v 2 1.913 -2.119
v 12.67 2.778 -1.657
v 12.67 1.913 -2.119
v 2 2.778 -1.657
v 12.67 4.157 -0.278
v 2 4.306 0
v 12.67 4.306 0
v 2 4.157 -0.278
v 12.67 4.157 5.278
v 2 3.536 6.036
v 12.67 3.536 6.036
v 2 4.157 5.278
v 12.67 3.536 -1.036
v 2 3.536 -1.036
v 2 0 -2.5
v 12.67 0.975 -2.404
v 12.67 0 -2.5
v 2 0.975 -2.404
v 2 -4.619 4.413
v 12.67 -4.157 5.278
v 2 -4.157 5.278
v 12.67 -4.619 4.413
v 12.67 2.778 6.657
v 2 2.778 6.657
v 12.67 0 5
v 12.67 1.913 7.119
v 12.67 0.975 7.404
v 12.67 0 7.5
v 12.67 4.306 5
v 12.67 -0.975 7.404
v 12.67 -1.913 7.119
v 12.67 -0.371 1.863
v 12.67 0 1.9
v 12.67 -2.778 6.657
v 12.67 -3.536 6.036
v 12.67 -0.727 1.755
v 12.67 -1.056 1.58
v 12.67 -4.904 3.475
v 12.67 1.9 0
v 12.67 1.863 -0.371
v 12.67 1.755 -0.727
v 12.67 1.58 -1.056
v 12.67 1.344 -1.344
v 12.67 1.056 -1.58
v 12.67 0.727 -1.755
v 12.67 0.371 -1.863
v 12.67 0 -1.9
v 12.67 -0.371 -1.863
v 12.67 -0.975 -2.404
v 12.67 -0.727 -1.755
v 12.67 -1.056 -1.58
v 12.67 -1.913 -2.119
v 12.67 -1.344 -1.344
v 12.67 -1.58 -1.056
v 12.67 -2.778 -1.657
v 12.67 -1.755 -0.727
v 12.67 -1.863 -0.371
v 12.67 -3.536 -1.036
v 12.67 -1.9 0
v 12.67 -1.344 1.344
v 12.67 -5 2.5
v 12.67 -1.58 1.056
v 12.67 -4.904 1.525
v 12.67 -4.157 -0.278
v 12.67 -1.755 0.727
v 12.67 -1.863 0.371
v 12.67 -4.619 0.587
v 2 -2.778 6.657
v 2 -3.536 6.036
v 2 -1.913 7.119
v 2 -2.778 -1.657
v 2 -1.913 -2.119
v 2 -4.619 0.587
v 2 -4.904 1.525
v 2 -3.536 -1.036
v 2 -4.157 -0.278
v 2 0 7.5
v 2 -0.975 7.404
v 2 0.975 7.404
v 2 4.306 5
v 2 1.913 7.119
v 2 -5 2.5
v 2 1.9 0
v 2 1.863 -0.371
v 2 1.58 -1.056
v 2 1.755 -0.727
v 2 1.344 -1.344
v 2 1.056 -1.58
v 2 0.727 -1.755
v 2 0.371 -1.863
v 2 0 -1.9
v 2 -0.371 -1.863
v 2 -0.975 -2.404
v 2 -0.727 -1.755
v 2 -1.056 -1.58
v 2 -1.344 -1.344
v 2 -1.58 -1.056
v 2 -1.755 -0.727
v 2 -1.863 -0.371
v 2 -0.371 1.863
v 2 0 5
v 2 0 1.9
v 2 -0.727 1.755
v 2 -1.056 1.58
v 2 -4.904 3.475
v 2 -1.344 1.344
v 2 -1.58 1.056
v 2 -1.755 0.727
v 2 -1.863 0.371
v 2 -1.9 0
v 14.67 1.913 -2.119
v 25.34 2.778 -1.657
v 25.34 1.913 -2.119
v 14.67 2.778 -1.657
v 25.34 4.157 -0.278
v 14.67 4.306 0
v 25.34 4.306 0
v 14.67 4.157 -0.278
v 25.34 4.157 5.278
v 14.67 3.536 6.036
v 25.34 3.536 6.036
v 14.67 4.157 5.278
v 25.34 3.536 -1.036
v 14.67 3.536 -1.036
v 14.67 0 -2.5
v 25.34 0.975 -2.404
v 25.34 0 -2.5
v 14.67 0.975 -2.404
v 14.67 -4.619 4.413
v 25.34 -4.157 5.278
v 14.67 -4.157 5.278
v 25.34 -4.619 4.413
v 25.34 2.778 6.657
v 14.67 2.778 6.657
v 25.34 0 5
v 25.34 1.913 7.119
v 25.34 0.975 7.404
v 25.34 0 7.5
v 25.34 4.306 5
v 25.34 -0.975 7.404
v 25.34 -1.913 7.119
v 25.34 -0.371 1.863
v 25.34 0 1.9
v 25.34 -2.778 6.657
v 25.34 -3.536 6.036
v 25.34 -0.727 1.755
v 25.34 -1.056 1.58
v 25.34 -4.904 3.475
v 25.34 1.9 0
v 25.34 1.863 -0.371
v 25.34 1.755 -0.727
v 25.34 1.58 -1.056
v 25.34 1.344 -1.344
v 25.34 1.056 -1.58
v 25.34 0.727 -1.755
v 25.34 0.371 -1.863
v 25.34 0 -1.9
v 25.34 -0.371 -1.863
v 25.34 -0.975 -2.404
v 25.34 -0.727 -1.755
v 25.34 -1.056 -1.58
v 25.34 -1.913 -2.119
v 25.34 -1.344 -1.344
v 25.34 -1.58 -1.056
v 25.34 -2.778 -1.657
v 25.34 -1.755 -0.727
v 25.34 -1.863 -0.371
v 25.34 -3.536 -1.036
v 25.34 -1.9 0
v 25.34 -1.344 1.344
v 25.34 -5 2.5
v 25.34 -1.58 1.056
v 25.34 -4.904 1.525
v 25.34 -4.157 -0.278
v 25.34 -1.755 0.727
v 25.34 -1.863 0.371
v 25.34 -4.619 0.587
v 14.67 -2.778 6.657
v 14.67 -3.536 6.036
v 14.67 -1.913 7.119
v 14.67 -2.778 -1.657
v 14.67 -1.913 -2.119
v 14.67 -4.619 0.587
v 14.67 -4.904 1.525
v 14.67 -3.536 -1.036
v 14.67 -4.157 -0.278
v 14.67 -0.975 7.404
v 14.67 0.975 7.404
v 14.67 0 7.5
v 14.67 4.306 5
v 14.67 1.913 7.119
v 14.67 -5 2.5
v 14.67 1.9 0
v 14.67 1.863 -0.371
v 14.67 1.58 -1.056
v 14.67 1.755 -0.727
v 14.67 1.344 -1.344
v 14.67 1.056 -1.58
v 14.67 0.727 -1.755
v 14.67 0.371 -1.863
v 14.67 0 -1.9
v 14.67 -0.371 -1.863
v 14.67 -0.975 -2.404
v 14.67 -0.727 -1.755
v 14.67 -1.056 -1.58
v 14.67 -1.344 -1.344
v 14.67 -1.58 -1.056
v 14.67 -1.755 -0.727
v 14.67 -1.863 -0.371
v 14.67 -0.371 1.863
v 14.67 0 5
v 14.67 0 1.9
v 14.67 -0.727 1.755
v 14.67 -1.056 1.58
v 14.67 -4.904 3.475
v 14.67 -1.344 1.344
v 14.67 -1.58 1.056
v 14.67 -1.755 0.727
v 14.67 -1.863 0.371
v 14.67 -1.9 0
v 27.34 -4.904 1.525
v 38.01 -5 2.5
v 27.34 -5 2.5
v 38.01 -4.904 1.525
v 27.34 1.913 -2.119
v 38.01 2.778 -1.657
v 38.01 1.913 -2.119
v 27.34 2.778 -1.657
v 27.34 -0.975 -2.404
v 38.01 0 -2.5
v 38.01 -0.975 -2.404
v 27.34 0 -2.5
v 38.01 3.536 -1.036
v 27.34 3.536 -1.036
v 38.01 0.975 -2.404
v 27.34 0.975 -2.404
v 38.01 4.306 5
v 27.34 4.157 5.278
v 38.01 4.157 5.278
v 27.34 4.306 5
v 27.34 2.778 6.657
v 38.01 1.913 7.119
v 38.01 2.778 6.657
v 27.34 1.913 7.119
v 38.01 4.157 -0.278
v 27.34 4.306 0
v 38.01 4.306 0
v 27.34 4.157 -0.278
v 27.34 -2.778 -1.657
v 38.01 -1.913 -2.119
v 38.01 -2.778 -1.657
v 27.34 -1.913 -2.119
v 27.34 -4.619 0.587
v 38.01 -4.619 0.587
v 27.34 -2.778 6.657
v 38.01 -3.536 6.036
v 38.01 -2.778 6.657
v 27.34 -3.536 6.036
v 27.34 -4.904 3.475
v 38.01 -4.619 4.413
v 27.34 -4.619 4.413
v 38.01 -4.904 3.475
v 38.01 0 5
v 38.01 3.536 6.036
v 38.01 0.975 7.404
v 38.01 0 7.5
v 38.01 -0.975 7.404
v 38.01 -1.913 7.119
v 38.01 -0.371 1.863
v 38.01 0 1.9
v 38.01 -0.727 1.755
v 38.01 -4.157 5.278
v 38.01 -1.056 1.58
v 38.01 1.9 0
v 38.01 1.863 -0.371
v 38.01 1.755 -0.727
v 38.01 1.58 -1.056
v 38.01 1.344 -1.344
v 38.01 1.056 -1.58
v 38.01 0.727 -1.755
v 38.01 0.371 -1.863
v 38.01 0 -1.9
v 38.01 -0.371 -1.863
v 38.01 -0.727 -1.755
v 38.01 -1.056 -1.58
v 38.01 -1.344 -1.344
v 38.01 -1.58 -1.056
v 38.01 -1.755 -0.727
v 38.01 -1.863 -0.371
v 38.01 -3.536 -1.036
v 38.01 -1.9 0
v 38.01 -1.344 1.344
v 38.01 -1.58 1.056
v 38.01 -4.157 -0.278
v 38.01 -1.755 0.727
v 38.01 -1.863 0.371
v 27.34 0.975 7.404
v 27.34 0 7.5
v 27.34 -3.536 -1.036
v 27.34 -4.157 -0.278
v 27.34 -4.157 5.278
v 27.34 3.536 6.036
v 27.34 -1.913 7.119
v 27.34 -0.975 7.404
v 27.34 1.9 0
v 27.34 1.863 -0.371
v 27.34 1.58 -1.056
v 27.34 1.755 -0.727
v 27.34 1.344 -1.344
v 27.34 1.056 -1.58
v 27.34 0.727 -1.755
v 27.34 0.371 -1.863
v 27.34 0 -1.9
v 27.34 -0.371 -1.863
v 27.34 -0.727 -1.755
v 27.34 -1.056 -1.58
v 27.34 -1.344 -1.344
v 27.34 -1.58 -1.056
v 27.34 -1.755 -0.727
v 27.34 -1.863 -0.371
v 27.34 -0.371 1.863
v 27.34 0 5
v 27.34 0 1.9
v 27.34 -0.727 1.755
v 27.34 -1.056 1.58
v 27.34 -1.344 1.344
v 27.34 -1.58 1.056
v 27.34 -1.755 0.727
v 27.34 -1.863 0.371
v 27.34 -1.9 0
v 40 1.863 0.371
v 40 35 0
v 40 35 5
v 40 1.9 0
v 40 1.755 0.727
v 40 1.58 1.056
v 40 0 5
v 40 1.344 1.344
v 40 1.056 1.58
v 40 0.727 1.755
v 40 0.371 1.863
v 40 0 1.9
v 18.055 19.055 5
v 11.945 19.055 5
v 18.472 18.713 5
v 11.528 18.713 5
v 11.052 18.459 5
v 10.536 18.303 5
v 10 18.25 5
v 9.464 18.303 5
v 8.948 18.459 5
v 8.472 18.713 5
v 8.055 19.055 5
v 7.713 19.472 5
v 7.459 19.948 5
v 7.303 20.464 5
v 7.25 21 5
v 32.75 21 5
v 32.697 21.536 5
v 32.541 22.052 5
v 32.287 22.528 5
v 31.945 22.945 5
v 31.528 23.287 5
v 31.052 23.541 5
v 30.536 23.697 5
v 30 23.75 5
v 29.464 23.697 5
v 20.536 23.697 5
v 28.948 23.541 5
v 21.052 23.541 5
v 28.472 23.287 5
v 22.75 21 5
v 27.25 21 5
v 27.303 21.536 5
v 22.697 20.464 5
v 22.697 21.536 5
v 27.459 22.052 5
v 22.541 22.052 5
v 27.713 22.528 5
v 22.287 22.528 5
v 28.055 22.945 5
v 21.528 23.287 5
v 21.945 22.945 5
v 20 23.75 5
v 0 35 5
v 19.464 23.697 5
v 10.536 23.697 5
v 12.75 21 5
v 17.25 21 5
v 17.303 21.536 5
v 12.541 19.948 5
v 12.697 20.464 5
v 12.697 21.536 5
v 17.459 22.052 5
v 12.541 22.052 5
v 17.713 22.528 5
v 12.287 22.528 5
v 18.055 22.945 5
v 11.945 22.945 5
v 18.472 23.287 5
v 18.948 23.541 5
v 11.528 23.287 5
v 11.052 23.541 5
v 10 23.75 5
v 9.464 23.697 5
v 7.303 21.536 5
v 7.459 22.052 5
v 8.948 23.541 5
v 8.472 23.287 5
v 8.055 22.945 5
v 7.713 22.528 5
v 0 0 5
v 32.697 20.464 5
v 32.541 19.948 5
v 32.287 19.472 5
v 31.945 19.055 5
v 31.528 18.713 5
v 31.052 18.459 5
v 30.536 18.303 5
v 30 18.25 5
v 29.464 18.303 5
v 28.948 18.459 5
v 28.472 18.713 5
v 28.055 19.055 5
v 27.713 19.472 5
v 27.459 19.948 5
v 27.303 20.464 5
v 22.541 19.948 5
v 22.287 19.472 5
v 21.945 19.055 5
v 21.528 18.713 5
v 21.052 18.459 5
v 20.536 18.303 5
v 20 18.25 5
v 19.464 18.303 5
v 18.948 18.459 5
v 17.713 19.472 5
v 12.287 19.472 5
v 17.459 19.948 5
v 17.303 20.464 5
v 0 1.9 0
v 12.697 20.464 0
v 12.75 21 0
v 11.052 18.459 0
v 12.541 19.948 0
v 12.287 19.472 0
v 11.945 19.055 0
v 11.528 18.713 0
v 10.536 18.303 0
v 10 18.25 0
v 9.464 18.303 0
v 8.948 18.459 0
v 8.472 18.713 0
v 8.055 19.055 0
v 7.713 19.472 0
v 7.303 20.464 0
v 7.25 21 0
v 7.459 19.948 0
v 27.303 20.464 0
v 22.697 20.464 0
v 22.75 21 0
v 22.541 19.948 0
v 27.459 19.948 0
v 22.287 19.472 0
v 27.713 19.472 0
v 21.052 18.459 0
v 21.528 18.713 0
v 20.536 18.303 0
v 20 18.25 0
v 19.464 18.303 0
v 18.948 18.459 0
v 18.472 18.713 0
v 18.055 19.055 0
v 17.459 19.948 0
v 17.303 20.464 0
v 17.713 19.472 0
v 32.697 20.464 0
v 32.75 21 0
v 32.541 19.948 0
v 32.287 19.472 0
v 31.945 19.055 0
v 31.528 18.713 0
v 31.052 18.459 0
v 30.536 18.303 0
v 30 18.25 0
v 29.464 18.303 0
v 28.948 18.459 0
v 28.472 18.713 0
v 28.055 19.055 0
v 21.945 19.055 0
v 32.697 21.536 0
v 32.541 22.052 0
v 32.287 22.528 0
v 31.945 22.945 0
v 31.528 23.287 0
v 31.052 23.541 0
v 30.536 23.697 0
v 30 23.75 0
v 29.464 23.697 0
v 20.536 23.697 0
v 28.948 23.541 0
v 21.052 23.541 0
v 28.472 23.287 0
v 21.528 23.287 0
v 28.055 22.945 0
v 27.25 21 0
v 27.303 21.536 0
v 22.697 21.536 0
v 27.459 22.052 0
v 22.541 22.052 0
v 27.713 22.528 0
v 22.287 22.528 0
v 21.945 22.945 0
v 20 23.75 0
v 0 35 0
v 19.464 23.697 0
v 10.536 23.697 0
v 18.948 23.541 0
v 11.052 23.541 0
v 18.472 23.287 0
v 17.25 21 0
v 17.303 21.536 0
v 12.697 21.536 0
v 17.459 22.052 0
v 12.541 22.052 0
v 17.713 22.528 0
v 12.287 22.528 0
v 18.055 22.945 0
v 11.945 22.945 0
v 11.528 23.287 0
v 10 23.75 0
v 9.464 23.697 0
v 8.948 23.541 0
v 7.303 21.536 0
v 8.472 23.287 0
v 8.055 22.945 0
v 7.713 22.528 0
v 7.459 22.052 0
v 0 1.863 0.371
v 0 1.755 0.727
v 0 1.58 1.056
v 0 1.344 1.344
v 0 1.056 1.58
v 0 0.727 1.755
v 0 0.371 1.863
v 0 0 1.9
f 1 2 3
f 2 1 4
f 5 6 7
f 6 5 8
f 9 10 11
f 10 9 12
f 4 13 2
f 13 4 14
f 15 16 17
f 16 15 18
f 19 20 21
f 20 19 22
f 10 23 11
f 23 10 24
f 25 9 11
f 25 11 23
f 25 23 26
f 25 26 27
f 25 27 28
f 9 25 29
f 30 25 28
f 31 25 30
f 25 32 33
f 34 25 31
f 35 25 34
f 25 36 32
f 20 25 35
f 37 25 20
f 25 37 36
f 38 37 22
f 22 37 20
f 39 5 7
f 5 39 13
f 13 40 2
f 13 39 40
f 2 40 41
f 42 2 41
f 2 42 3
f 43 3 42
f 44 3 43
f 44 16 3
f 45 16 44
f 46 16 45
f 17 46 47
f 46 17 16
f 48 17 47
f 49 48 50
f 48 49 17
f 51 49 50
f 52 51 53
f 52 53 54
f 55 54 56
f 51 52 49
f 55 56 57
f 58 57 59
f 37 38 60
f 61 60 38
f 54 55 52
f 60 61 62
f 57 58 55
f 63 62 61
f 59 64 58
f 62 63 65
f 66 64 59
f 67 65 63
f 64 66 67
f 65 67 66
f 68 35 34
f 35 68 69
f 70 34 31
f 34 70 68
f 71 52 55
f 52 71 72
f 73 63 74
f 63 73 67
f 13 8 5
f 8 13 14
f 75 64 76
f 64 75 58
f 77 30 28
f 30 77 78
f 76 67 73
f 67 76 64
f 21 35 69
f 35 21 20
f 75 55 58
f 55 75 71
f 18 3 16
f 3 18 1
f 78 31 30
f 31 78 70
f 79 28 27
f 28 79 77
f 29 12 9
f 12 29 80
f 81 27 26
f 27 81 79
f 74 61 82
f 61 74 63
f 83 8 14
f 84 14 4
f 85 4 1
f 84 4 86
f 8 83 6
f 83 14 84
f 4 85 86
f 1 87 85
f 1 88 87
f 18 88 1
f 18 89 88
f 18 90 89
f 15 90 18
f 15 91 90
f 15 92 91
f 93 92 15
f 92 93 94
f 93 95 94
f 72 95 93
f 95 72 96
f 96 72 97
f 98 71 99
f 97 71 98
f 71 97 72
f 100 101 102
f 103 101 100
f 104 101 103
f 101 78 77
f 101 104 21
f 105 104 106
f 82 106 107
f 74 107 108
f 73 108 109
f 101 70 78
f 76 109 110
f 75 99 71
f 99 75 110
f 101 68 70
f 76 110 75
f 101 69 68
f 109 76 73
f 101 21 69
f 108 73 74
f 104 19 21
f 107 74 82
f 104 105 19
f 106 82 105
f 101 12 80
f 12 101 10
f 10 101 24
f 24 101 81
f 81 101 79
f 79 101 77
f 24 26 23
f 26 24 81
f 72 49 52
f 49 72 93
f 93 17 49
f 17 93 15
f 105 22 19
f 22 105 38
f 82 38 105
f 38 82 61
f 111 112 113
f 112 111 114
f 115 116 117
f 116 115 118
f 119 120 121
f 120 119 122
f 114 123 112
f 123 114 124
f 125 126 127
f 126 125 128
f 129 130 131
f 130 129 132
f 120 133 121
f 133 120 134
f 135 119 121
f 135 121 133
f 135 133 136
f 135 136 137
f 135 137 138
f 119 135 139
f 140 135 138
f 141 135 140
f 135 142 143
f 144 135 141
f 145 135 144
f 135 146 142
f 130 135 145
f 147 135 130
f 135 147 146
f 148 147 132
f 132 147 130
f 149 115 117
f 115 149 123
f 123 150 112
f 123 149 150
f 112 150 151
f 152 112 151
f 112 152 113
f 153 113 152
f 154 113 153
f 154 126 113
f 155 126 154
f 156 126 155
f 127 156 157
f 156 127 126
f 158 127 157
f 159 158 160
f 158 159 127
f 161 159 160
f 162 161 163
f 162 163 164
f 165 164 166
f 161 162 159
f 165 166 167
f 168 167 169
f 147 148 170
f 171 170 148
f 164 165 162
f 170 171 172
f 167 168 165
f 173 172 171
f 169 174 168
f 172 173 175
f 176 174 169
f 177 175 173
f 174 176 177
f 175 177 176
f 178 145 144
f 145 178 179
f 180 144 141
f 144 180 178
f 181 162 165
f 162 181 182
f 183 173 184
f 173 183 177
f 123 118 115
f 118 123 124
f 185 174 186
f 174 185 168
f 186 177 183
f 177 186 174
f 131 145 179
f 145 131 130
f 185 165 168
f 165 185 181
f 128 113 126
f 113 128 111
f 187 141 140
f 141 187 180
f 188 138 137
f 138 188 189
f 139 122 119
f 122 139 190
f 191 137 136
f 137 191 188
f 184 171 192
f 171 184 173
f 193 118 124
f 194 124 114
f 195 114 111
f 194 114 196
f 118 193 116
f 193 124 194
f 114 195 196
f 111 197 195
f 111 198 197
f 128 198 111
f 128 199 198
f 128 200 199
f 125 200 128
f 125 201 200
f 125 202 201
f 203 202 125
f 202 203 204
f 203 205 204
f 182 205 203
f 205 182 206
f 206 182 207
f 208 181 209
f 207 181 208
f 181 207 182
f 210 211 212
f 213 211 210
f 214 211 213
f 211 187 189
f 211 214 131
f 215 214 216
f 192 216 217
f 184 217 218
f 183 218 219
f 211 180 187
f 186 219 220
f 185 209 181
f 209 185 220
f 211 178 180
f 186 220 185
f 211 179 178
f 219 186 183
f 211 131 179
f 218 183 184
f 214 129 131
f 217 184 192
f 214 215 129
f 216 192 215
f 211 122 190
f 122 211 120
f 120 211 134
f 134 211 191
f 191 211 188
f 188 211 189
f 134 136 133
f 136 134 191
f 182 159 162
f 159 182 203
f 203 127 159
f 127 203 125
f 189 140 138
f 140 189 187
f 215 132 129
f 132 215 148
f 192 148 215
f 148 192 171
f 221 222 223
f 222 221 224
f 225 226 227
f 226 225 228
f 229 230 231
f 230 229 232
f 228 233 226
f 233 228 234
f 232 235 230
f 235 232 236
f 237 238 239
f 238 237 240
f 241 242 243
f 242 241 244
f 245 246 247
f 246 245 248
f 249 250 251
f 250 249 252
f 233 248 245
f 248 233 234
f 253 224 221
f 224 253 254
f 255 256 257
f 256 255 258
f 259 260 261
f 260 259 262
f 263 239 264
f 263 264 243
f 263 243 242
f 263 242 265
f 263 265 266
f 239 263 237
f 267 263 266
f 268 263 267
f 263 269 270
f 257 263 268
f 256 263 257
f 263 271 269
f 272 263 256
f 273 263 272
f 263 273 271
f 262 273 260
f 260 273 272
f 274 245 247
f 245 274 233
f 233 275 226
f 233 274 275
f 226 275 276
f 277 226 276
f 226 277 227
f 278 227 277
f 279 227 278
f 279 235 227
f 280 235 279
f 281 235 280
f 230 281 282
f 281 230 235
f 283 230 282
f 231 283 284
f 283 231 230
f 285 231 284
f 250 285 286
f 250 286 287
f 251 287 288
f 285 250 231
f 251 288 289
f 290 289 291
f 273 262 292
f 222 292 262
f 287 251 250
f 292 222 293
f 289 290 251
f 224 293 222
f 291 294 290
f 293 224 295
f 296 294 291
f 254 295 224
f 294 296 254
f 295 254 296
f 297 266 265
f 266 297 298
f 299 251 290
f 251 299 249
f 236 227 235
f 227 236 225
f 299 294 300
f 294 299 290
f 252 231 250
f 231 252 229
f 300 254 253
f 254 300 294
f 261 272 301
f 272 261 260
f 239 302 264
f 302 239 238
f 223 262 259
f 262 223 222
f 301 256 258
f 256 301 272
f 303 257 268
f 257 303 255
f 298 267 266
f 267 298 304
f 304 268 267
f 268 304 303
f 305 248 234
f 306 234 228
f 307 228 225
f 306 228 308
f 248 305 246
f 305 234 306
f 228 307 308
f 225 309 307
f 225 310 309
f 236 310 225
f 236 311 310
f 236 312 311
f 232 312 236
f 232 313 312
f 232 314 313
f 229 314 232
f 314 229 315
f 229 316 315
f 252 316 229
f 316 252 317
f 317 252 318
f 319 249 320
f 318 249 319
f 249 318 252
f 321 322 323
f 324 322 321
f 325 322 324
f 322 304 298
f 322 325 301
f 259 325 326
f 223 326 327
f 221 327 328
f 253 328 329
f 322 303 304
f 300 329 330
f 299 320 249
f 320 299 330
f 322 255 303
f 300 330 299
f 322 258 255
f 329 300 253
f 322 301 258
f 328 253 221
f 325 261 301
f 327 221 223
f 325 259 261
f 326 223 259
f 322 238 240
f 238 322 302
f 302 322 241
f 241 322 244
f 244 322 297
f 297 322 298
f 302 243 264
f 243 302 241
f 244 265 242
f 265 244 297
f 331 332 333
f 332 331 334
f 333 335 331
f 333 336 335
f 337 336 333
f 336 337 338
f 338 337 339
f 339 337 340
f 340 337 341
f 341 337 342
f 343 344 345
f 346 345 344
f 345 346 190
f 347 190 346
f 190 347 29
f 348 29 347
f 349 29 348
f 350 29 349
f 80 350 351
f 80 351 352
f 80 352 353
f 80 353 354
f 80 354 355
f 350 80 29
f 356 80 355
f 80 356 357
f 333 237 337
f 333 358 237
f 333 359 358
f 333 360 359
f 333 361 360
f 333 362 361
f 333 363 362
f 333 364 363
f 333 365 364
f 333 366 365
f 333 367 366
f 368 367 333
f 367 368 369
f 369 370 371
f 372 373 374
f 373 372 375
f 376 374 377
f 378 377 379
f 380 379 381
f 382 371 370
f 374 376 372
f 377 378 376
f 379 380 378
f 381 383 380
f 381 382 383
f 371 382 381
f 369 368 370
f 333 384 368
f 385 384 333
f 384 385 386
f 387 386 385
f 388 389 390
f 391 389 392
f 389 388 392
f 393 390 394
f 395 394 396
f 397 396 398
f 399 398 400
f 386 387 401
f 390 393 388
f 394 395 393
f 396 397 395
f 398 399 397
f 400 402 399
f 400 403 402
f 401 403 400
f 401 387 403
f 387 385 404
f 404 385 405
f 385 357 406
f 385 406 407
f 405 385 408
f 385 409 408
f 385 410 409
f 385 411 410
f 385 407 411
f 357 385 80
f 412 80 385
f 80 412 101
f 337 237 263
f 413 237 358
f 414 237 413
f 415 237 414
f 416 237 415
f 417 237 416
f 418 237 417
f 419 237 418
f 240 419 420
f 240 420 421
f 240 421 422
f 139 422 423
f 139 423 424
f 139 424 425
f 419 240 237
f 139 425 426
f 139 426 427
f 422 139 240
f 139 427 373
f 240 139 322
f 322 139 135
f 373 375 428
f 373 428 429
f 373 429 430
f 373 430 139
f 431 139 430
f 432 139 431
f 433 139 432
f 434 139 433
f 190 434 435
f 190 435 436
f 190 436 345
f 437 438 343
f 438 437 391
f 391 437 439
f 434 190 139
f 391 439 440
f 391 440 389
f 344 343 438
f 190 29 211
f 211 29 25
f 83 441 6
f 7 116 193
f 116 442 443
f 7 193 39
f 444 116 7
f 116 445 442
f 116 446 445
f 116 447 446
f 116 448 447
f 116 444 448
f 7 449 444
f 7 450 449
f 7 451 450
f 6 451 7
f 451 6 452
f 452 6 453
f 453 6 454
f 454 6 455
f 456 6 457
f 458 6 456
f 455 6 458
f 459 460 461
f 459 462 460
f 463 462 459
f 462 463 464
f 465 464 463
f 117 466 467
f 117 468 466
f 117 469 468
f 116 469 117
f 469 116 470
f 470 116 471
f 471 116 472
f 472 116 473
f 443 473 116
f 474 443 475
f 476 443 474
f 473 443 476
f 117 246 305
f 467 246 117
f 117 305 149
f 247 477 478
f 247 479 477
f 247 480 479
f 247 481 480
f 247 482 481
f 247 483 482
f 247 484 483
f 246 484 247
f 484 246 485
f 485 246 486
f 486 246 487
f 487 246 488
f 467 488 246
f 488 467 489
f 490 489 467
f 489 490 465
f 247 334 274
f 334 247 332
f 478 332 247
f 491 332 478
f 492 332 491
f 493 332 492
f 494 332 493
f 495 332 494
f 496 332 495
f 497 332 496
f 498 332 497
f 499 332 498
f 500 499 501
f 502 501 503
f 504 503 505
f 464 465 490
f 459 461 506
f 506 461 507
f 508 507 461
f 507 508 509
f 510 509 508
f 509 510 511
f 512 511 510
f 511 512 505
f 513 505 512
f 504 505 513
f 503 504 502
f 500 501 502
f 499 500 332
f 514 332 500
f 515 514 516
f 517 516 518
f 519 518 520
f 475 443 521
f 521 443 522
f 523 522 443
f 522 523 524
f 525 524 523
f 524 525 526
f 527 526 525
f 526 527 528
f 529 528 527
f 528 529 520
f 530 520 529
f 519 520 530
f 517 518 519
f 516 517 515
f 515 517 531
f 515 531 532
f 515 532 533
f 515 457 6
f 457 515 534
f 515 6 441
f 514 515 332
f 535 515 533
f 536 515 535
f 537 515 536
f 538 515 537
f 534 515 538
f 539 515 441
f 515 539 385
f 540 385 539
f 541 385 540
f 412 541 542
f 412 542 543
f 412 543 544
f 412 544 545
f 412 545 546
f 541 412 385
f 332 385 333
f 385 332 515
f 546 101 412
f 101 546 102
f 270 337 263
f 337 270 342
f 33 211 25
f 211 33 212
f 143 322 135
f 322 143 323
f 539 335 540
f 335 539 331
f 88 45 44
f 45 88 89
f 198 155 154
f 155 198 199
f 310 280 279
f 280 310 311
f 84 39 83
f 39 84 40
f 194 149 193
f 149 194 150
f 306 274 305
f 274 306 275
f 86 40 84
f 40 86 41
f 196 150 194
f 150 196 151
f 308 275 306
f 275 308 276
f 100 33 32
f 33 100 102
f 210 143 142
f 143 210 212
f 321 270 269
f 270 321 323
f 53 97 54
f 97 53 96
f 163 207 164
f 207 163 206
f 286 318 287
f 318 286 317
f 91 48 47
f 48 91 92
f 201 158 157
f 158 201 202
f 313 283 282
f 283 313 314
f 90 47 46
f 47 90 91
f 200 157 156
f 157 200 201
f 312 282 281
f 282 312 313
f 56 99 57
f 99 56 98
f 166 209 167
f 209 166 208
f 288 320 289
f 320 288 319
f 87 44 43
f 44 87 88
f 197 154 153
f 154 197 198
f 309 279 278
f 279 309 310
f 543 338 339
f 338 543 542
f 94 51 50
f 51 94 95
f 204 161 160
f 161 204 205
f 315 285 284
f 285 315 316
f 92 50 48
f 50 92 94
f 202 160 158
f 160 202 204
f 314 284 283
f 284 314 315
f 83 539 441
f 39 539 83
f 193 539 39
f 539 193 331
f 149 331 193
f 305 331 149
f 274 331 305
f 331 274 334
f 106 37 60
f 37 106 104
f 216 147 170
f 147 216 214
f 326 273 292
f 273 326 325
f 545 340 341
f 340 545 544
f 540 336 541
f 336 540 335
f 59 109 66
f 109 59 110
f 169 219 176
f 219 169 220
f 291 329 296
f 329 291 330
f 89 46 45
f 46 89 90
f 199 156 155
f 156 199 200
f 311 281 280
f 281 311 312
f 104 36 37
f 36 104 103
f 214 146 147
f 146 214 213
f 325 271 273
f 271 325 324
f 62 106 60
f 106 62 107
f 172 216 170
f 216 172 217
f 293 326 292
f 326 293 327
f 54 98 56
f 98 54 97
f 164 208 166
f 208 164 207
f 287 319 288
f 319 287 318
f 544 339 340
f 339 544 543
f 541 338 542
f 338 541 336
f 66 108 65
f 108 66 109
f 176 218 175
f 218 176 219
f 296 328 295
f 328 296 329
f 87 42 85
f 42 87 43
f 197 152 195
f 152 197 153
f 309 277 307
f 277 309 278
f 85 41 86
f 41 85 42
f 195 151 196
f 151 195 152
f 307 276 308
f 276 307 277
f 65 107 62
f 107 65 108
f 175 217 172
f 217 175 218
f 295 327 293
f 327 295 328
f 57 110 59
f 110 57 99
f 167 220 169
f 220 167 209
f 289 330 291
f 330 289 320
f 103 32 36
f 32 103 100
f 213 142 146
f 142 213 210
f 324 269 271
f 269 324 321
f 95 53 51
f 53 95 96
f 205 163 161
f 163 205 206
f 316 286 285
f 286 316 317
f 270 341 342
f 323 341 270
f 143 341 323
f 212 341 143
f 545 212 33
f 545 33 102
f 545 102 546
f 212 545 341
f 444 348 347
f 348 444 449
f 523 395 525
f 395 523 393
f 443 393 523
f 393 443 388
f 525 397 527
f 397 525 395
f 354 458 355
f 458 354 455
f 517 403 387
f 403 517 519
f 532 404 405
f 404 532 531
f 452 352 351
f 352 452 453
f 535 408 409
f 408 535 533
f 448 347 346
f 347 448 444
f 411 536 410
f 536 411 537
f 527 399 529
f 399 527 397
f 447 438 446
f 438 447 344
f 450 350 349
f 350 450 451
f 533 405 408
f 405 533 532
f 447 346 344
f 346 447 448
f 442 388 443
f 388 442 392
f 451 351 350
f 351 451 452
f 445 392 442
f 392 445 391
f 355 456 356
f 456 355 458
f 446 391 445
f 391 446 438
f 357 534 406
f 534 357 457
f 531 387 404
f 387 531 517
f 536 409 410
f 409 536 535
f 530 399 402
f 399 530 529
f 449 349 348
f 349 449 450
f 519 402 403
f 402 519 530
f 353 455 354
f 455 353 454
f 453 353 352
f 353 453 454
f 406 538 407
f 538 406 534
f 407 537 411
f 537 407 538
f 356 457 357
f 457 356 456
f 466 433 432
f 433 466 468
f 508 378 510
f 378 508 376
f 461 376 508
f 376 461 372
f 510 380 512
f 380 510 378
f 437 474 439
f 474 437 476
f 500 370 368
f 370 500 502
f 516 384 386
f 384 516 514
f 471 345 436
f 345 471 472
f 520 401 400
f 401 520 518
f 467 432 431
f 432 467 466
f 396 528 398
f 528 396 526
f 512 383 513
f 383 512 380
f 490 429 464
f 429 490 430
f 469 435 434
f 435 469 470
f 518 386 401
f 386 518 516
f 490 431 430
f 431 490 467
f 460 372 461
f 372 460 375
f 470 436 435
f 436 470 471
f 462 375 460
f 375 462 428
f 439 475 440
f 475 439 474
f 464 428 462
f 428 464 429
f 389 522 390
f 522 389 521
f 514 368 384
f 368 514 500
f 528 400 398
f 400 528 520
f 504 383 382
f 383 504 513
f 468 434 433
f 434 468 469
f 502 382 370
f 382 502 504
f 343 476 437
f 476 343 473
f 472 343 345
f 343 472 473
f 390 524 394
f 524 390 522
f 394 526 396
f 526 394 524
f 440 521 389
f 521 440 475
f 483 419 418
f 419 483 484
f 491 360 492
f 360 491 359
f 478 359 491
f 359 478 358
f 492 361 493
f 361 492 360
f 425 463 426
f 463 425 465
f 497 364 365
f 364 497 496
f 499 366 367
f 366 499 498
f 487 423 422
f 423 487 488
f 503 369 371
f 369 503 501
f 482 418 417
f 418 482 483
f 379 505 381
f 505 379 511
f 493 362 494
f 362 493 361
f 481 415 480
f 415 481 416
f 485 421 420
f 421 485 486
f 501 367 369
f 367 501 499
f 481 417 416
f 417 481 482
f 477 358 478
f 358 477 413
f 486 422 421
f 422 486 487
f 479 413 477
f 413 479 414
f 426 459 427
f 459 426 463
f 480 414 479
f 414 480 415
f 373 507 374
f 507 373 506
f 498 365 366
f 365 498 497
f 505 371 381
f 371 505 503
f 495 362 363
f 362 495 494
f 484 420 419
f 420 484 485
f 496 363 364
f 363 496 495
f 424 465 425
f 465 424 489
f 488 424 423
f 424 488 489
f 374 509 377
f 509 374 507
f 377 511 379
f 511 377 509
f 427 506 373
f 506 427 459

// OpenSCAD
$fn = 32;

// ----------------------------------------------------------------------
// Hinge leaf: 40 x 40 x 10 mm
// ----------------------------------------------------------------------

// --- parameters (mm) ---
leaf_len = 40;            // leaf length, X
leaf_w = 35;              // leaf width, Y
leaf_t = 5;               // leaf thickness
knuckle_d = 10;           // knuckle diameter
knuckle_w = 10.67;        // knuckle width
knuckle_n = 3;            // number of knuckles
pin_d = 3.8;              // pin bore
gap = 2;                  // gap between the knuckles
screw_d = 5.5;            // screw clearance

module leaf() {
  cube([leaf_len, leaf_w, leaf_t]);
}

module knuckles() {
  /* barrels sit on the leaf edge, the pin axis at half the leaf thickness */
  for (i = [0 : knuckle_n - 1])
    translate([gap + i * (knuckle_w + gap), 0, leaf_t * 0.5])
      rotate([0, 90, 0]) cylinder(h = knuckle_w, d = knuckle_d);
}

difference() {
  union() {
    leaf();
    knuckles();
  }
  rotate([0, 90, 0]) translate([0, 0, -1])
    cylinder(h = leaf_len + 2, d = pin_d);
  translate([10, leaf_w * 0.6, -1]) cylinder(h = leaf_t + 2, d = screw_d);
  translate([20, leaf_w * 0.6, -1]) cylinder(h = leaf_t + 2, d = screw_d);
  translate([30, leaf_w * 0.6, -1]) cylinder(h = leaf_t + 2, d = screw_d);
}
